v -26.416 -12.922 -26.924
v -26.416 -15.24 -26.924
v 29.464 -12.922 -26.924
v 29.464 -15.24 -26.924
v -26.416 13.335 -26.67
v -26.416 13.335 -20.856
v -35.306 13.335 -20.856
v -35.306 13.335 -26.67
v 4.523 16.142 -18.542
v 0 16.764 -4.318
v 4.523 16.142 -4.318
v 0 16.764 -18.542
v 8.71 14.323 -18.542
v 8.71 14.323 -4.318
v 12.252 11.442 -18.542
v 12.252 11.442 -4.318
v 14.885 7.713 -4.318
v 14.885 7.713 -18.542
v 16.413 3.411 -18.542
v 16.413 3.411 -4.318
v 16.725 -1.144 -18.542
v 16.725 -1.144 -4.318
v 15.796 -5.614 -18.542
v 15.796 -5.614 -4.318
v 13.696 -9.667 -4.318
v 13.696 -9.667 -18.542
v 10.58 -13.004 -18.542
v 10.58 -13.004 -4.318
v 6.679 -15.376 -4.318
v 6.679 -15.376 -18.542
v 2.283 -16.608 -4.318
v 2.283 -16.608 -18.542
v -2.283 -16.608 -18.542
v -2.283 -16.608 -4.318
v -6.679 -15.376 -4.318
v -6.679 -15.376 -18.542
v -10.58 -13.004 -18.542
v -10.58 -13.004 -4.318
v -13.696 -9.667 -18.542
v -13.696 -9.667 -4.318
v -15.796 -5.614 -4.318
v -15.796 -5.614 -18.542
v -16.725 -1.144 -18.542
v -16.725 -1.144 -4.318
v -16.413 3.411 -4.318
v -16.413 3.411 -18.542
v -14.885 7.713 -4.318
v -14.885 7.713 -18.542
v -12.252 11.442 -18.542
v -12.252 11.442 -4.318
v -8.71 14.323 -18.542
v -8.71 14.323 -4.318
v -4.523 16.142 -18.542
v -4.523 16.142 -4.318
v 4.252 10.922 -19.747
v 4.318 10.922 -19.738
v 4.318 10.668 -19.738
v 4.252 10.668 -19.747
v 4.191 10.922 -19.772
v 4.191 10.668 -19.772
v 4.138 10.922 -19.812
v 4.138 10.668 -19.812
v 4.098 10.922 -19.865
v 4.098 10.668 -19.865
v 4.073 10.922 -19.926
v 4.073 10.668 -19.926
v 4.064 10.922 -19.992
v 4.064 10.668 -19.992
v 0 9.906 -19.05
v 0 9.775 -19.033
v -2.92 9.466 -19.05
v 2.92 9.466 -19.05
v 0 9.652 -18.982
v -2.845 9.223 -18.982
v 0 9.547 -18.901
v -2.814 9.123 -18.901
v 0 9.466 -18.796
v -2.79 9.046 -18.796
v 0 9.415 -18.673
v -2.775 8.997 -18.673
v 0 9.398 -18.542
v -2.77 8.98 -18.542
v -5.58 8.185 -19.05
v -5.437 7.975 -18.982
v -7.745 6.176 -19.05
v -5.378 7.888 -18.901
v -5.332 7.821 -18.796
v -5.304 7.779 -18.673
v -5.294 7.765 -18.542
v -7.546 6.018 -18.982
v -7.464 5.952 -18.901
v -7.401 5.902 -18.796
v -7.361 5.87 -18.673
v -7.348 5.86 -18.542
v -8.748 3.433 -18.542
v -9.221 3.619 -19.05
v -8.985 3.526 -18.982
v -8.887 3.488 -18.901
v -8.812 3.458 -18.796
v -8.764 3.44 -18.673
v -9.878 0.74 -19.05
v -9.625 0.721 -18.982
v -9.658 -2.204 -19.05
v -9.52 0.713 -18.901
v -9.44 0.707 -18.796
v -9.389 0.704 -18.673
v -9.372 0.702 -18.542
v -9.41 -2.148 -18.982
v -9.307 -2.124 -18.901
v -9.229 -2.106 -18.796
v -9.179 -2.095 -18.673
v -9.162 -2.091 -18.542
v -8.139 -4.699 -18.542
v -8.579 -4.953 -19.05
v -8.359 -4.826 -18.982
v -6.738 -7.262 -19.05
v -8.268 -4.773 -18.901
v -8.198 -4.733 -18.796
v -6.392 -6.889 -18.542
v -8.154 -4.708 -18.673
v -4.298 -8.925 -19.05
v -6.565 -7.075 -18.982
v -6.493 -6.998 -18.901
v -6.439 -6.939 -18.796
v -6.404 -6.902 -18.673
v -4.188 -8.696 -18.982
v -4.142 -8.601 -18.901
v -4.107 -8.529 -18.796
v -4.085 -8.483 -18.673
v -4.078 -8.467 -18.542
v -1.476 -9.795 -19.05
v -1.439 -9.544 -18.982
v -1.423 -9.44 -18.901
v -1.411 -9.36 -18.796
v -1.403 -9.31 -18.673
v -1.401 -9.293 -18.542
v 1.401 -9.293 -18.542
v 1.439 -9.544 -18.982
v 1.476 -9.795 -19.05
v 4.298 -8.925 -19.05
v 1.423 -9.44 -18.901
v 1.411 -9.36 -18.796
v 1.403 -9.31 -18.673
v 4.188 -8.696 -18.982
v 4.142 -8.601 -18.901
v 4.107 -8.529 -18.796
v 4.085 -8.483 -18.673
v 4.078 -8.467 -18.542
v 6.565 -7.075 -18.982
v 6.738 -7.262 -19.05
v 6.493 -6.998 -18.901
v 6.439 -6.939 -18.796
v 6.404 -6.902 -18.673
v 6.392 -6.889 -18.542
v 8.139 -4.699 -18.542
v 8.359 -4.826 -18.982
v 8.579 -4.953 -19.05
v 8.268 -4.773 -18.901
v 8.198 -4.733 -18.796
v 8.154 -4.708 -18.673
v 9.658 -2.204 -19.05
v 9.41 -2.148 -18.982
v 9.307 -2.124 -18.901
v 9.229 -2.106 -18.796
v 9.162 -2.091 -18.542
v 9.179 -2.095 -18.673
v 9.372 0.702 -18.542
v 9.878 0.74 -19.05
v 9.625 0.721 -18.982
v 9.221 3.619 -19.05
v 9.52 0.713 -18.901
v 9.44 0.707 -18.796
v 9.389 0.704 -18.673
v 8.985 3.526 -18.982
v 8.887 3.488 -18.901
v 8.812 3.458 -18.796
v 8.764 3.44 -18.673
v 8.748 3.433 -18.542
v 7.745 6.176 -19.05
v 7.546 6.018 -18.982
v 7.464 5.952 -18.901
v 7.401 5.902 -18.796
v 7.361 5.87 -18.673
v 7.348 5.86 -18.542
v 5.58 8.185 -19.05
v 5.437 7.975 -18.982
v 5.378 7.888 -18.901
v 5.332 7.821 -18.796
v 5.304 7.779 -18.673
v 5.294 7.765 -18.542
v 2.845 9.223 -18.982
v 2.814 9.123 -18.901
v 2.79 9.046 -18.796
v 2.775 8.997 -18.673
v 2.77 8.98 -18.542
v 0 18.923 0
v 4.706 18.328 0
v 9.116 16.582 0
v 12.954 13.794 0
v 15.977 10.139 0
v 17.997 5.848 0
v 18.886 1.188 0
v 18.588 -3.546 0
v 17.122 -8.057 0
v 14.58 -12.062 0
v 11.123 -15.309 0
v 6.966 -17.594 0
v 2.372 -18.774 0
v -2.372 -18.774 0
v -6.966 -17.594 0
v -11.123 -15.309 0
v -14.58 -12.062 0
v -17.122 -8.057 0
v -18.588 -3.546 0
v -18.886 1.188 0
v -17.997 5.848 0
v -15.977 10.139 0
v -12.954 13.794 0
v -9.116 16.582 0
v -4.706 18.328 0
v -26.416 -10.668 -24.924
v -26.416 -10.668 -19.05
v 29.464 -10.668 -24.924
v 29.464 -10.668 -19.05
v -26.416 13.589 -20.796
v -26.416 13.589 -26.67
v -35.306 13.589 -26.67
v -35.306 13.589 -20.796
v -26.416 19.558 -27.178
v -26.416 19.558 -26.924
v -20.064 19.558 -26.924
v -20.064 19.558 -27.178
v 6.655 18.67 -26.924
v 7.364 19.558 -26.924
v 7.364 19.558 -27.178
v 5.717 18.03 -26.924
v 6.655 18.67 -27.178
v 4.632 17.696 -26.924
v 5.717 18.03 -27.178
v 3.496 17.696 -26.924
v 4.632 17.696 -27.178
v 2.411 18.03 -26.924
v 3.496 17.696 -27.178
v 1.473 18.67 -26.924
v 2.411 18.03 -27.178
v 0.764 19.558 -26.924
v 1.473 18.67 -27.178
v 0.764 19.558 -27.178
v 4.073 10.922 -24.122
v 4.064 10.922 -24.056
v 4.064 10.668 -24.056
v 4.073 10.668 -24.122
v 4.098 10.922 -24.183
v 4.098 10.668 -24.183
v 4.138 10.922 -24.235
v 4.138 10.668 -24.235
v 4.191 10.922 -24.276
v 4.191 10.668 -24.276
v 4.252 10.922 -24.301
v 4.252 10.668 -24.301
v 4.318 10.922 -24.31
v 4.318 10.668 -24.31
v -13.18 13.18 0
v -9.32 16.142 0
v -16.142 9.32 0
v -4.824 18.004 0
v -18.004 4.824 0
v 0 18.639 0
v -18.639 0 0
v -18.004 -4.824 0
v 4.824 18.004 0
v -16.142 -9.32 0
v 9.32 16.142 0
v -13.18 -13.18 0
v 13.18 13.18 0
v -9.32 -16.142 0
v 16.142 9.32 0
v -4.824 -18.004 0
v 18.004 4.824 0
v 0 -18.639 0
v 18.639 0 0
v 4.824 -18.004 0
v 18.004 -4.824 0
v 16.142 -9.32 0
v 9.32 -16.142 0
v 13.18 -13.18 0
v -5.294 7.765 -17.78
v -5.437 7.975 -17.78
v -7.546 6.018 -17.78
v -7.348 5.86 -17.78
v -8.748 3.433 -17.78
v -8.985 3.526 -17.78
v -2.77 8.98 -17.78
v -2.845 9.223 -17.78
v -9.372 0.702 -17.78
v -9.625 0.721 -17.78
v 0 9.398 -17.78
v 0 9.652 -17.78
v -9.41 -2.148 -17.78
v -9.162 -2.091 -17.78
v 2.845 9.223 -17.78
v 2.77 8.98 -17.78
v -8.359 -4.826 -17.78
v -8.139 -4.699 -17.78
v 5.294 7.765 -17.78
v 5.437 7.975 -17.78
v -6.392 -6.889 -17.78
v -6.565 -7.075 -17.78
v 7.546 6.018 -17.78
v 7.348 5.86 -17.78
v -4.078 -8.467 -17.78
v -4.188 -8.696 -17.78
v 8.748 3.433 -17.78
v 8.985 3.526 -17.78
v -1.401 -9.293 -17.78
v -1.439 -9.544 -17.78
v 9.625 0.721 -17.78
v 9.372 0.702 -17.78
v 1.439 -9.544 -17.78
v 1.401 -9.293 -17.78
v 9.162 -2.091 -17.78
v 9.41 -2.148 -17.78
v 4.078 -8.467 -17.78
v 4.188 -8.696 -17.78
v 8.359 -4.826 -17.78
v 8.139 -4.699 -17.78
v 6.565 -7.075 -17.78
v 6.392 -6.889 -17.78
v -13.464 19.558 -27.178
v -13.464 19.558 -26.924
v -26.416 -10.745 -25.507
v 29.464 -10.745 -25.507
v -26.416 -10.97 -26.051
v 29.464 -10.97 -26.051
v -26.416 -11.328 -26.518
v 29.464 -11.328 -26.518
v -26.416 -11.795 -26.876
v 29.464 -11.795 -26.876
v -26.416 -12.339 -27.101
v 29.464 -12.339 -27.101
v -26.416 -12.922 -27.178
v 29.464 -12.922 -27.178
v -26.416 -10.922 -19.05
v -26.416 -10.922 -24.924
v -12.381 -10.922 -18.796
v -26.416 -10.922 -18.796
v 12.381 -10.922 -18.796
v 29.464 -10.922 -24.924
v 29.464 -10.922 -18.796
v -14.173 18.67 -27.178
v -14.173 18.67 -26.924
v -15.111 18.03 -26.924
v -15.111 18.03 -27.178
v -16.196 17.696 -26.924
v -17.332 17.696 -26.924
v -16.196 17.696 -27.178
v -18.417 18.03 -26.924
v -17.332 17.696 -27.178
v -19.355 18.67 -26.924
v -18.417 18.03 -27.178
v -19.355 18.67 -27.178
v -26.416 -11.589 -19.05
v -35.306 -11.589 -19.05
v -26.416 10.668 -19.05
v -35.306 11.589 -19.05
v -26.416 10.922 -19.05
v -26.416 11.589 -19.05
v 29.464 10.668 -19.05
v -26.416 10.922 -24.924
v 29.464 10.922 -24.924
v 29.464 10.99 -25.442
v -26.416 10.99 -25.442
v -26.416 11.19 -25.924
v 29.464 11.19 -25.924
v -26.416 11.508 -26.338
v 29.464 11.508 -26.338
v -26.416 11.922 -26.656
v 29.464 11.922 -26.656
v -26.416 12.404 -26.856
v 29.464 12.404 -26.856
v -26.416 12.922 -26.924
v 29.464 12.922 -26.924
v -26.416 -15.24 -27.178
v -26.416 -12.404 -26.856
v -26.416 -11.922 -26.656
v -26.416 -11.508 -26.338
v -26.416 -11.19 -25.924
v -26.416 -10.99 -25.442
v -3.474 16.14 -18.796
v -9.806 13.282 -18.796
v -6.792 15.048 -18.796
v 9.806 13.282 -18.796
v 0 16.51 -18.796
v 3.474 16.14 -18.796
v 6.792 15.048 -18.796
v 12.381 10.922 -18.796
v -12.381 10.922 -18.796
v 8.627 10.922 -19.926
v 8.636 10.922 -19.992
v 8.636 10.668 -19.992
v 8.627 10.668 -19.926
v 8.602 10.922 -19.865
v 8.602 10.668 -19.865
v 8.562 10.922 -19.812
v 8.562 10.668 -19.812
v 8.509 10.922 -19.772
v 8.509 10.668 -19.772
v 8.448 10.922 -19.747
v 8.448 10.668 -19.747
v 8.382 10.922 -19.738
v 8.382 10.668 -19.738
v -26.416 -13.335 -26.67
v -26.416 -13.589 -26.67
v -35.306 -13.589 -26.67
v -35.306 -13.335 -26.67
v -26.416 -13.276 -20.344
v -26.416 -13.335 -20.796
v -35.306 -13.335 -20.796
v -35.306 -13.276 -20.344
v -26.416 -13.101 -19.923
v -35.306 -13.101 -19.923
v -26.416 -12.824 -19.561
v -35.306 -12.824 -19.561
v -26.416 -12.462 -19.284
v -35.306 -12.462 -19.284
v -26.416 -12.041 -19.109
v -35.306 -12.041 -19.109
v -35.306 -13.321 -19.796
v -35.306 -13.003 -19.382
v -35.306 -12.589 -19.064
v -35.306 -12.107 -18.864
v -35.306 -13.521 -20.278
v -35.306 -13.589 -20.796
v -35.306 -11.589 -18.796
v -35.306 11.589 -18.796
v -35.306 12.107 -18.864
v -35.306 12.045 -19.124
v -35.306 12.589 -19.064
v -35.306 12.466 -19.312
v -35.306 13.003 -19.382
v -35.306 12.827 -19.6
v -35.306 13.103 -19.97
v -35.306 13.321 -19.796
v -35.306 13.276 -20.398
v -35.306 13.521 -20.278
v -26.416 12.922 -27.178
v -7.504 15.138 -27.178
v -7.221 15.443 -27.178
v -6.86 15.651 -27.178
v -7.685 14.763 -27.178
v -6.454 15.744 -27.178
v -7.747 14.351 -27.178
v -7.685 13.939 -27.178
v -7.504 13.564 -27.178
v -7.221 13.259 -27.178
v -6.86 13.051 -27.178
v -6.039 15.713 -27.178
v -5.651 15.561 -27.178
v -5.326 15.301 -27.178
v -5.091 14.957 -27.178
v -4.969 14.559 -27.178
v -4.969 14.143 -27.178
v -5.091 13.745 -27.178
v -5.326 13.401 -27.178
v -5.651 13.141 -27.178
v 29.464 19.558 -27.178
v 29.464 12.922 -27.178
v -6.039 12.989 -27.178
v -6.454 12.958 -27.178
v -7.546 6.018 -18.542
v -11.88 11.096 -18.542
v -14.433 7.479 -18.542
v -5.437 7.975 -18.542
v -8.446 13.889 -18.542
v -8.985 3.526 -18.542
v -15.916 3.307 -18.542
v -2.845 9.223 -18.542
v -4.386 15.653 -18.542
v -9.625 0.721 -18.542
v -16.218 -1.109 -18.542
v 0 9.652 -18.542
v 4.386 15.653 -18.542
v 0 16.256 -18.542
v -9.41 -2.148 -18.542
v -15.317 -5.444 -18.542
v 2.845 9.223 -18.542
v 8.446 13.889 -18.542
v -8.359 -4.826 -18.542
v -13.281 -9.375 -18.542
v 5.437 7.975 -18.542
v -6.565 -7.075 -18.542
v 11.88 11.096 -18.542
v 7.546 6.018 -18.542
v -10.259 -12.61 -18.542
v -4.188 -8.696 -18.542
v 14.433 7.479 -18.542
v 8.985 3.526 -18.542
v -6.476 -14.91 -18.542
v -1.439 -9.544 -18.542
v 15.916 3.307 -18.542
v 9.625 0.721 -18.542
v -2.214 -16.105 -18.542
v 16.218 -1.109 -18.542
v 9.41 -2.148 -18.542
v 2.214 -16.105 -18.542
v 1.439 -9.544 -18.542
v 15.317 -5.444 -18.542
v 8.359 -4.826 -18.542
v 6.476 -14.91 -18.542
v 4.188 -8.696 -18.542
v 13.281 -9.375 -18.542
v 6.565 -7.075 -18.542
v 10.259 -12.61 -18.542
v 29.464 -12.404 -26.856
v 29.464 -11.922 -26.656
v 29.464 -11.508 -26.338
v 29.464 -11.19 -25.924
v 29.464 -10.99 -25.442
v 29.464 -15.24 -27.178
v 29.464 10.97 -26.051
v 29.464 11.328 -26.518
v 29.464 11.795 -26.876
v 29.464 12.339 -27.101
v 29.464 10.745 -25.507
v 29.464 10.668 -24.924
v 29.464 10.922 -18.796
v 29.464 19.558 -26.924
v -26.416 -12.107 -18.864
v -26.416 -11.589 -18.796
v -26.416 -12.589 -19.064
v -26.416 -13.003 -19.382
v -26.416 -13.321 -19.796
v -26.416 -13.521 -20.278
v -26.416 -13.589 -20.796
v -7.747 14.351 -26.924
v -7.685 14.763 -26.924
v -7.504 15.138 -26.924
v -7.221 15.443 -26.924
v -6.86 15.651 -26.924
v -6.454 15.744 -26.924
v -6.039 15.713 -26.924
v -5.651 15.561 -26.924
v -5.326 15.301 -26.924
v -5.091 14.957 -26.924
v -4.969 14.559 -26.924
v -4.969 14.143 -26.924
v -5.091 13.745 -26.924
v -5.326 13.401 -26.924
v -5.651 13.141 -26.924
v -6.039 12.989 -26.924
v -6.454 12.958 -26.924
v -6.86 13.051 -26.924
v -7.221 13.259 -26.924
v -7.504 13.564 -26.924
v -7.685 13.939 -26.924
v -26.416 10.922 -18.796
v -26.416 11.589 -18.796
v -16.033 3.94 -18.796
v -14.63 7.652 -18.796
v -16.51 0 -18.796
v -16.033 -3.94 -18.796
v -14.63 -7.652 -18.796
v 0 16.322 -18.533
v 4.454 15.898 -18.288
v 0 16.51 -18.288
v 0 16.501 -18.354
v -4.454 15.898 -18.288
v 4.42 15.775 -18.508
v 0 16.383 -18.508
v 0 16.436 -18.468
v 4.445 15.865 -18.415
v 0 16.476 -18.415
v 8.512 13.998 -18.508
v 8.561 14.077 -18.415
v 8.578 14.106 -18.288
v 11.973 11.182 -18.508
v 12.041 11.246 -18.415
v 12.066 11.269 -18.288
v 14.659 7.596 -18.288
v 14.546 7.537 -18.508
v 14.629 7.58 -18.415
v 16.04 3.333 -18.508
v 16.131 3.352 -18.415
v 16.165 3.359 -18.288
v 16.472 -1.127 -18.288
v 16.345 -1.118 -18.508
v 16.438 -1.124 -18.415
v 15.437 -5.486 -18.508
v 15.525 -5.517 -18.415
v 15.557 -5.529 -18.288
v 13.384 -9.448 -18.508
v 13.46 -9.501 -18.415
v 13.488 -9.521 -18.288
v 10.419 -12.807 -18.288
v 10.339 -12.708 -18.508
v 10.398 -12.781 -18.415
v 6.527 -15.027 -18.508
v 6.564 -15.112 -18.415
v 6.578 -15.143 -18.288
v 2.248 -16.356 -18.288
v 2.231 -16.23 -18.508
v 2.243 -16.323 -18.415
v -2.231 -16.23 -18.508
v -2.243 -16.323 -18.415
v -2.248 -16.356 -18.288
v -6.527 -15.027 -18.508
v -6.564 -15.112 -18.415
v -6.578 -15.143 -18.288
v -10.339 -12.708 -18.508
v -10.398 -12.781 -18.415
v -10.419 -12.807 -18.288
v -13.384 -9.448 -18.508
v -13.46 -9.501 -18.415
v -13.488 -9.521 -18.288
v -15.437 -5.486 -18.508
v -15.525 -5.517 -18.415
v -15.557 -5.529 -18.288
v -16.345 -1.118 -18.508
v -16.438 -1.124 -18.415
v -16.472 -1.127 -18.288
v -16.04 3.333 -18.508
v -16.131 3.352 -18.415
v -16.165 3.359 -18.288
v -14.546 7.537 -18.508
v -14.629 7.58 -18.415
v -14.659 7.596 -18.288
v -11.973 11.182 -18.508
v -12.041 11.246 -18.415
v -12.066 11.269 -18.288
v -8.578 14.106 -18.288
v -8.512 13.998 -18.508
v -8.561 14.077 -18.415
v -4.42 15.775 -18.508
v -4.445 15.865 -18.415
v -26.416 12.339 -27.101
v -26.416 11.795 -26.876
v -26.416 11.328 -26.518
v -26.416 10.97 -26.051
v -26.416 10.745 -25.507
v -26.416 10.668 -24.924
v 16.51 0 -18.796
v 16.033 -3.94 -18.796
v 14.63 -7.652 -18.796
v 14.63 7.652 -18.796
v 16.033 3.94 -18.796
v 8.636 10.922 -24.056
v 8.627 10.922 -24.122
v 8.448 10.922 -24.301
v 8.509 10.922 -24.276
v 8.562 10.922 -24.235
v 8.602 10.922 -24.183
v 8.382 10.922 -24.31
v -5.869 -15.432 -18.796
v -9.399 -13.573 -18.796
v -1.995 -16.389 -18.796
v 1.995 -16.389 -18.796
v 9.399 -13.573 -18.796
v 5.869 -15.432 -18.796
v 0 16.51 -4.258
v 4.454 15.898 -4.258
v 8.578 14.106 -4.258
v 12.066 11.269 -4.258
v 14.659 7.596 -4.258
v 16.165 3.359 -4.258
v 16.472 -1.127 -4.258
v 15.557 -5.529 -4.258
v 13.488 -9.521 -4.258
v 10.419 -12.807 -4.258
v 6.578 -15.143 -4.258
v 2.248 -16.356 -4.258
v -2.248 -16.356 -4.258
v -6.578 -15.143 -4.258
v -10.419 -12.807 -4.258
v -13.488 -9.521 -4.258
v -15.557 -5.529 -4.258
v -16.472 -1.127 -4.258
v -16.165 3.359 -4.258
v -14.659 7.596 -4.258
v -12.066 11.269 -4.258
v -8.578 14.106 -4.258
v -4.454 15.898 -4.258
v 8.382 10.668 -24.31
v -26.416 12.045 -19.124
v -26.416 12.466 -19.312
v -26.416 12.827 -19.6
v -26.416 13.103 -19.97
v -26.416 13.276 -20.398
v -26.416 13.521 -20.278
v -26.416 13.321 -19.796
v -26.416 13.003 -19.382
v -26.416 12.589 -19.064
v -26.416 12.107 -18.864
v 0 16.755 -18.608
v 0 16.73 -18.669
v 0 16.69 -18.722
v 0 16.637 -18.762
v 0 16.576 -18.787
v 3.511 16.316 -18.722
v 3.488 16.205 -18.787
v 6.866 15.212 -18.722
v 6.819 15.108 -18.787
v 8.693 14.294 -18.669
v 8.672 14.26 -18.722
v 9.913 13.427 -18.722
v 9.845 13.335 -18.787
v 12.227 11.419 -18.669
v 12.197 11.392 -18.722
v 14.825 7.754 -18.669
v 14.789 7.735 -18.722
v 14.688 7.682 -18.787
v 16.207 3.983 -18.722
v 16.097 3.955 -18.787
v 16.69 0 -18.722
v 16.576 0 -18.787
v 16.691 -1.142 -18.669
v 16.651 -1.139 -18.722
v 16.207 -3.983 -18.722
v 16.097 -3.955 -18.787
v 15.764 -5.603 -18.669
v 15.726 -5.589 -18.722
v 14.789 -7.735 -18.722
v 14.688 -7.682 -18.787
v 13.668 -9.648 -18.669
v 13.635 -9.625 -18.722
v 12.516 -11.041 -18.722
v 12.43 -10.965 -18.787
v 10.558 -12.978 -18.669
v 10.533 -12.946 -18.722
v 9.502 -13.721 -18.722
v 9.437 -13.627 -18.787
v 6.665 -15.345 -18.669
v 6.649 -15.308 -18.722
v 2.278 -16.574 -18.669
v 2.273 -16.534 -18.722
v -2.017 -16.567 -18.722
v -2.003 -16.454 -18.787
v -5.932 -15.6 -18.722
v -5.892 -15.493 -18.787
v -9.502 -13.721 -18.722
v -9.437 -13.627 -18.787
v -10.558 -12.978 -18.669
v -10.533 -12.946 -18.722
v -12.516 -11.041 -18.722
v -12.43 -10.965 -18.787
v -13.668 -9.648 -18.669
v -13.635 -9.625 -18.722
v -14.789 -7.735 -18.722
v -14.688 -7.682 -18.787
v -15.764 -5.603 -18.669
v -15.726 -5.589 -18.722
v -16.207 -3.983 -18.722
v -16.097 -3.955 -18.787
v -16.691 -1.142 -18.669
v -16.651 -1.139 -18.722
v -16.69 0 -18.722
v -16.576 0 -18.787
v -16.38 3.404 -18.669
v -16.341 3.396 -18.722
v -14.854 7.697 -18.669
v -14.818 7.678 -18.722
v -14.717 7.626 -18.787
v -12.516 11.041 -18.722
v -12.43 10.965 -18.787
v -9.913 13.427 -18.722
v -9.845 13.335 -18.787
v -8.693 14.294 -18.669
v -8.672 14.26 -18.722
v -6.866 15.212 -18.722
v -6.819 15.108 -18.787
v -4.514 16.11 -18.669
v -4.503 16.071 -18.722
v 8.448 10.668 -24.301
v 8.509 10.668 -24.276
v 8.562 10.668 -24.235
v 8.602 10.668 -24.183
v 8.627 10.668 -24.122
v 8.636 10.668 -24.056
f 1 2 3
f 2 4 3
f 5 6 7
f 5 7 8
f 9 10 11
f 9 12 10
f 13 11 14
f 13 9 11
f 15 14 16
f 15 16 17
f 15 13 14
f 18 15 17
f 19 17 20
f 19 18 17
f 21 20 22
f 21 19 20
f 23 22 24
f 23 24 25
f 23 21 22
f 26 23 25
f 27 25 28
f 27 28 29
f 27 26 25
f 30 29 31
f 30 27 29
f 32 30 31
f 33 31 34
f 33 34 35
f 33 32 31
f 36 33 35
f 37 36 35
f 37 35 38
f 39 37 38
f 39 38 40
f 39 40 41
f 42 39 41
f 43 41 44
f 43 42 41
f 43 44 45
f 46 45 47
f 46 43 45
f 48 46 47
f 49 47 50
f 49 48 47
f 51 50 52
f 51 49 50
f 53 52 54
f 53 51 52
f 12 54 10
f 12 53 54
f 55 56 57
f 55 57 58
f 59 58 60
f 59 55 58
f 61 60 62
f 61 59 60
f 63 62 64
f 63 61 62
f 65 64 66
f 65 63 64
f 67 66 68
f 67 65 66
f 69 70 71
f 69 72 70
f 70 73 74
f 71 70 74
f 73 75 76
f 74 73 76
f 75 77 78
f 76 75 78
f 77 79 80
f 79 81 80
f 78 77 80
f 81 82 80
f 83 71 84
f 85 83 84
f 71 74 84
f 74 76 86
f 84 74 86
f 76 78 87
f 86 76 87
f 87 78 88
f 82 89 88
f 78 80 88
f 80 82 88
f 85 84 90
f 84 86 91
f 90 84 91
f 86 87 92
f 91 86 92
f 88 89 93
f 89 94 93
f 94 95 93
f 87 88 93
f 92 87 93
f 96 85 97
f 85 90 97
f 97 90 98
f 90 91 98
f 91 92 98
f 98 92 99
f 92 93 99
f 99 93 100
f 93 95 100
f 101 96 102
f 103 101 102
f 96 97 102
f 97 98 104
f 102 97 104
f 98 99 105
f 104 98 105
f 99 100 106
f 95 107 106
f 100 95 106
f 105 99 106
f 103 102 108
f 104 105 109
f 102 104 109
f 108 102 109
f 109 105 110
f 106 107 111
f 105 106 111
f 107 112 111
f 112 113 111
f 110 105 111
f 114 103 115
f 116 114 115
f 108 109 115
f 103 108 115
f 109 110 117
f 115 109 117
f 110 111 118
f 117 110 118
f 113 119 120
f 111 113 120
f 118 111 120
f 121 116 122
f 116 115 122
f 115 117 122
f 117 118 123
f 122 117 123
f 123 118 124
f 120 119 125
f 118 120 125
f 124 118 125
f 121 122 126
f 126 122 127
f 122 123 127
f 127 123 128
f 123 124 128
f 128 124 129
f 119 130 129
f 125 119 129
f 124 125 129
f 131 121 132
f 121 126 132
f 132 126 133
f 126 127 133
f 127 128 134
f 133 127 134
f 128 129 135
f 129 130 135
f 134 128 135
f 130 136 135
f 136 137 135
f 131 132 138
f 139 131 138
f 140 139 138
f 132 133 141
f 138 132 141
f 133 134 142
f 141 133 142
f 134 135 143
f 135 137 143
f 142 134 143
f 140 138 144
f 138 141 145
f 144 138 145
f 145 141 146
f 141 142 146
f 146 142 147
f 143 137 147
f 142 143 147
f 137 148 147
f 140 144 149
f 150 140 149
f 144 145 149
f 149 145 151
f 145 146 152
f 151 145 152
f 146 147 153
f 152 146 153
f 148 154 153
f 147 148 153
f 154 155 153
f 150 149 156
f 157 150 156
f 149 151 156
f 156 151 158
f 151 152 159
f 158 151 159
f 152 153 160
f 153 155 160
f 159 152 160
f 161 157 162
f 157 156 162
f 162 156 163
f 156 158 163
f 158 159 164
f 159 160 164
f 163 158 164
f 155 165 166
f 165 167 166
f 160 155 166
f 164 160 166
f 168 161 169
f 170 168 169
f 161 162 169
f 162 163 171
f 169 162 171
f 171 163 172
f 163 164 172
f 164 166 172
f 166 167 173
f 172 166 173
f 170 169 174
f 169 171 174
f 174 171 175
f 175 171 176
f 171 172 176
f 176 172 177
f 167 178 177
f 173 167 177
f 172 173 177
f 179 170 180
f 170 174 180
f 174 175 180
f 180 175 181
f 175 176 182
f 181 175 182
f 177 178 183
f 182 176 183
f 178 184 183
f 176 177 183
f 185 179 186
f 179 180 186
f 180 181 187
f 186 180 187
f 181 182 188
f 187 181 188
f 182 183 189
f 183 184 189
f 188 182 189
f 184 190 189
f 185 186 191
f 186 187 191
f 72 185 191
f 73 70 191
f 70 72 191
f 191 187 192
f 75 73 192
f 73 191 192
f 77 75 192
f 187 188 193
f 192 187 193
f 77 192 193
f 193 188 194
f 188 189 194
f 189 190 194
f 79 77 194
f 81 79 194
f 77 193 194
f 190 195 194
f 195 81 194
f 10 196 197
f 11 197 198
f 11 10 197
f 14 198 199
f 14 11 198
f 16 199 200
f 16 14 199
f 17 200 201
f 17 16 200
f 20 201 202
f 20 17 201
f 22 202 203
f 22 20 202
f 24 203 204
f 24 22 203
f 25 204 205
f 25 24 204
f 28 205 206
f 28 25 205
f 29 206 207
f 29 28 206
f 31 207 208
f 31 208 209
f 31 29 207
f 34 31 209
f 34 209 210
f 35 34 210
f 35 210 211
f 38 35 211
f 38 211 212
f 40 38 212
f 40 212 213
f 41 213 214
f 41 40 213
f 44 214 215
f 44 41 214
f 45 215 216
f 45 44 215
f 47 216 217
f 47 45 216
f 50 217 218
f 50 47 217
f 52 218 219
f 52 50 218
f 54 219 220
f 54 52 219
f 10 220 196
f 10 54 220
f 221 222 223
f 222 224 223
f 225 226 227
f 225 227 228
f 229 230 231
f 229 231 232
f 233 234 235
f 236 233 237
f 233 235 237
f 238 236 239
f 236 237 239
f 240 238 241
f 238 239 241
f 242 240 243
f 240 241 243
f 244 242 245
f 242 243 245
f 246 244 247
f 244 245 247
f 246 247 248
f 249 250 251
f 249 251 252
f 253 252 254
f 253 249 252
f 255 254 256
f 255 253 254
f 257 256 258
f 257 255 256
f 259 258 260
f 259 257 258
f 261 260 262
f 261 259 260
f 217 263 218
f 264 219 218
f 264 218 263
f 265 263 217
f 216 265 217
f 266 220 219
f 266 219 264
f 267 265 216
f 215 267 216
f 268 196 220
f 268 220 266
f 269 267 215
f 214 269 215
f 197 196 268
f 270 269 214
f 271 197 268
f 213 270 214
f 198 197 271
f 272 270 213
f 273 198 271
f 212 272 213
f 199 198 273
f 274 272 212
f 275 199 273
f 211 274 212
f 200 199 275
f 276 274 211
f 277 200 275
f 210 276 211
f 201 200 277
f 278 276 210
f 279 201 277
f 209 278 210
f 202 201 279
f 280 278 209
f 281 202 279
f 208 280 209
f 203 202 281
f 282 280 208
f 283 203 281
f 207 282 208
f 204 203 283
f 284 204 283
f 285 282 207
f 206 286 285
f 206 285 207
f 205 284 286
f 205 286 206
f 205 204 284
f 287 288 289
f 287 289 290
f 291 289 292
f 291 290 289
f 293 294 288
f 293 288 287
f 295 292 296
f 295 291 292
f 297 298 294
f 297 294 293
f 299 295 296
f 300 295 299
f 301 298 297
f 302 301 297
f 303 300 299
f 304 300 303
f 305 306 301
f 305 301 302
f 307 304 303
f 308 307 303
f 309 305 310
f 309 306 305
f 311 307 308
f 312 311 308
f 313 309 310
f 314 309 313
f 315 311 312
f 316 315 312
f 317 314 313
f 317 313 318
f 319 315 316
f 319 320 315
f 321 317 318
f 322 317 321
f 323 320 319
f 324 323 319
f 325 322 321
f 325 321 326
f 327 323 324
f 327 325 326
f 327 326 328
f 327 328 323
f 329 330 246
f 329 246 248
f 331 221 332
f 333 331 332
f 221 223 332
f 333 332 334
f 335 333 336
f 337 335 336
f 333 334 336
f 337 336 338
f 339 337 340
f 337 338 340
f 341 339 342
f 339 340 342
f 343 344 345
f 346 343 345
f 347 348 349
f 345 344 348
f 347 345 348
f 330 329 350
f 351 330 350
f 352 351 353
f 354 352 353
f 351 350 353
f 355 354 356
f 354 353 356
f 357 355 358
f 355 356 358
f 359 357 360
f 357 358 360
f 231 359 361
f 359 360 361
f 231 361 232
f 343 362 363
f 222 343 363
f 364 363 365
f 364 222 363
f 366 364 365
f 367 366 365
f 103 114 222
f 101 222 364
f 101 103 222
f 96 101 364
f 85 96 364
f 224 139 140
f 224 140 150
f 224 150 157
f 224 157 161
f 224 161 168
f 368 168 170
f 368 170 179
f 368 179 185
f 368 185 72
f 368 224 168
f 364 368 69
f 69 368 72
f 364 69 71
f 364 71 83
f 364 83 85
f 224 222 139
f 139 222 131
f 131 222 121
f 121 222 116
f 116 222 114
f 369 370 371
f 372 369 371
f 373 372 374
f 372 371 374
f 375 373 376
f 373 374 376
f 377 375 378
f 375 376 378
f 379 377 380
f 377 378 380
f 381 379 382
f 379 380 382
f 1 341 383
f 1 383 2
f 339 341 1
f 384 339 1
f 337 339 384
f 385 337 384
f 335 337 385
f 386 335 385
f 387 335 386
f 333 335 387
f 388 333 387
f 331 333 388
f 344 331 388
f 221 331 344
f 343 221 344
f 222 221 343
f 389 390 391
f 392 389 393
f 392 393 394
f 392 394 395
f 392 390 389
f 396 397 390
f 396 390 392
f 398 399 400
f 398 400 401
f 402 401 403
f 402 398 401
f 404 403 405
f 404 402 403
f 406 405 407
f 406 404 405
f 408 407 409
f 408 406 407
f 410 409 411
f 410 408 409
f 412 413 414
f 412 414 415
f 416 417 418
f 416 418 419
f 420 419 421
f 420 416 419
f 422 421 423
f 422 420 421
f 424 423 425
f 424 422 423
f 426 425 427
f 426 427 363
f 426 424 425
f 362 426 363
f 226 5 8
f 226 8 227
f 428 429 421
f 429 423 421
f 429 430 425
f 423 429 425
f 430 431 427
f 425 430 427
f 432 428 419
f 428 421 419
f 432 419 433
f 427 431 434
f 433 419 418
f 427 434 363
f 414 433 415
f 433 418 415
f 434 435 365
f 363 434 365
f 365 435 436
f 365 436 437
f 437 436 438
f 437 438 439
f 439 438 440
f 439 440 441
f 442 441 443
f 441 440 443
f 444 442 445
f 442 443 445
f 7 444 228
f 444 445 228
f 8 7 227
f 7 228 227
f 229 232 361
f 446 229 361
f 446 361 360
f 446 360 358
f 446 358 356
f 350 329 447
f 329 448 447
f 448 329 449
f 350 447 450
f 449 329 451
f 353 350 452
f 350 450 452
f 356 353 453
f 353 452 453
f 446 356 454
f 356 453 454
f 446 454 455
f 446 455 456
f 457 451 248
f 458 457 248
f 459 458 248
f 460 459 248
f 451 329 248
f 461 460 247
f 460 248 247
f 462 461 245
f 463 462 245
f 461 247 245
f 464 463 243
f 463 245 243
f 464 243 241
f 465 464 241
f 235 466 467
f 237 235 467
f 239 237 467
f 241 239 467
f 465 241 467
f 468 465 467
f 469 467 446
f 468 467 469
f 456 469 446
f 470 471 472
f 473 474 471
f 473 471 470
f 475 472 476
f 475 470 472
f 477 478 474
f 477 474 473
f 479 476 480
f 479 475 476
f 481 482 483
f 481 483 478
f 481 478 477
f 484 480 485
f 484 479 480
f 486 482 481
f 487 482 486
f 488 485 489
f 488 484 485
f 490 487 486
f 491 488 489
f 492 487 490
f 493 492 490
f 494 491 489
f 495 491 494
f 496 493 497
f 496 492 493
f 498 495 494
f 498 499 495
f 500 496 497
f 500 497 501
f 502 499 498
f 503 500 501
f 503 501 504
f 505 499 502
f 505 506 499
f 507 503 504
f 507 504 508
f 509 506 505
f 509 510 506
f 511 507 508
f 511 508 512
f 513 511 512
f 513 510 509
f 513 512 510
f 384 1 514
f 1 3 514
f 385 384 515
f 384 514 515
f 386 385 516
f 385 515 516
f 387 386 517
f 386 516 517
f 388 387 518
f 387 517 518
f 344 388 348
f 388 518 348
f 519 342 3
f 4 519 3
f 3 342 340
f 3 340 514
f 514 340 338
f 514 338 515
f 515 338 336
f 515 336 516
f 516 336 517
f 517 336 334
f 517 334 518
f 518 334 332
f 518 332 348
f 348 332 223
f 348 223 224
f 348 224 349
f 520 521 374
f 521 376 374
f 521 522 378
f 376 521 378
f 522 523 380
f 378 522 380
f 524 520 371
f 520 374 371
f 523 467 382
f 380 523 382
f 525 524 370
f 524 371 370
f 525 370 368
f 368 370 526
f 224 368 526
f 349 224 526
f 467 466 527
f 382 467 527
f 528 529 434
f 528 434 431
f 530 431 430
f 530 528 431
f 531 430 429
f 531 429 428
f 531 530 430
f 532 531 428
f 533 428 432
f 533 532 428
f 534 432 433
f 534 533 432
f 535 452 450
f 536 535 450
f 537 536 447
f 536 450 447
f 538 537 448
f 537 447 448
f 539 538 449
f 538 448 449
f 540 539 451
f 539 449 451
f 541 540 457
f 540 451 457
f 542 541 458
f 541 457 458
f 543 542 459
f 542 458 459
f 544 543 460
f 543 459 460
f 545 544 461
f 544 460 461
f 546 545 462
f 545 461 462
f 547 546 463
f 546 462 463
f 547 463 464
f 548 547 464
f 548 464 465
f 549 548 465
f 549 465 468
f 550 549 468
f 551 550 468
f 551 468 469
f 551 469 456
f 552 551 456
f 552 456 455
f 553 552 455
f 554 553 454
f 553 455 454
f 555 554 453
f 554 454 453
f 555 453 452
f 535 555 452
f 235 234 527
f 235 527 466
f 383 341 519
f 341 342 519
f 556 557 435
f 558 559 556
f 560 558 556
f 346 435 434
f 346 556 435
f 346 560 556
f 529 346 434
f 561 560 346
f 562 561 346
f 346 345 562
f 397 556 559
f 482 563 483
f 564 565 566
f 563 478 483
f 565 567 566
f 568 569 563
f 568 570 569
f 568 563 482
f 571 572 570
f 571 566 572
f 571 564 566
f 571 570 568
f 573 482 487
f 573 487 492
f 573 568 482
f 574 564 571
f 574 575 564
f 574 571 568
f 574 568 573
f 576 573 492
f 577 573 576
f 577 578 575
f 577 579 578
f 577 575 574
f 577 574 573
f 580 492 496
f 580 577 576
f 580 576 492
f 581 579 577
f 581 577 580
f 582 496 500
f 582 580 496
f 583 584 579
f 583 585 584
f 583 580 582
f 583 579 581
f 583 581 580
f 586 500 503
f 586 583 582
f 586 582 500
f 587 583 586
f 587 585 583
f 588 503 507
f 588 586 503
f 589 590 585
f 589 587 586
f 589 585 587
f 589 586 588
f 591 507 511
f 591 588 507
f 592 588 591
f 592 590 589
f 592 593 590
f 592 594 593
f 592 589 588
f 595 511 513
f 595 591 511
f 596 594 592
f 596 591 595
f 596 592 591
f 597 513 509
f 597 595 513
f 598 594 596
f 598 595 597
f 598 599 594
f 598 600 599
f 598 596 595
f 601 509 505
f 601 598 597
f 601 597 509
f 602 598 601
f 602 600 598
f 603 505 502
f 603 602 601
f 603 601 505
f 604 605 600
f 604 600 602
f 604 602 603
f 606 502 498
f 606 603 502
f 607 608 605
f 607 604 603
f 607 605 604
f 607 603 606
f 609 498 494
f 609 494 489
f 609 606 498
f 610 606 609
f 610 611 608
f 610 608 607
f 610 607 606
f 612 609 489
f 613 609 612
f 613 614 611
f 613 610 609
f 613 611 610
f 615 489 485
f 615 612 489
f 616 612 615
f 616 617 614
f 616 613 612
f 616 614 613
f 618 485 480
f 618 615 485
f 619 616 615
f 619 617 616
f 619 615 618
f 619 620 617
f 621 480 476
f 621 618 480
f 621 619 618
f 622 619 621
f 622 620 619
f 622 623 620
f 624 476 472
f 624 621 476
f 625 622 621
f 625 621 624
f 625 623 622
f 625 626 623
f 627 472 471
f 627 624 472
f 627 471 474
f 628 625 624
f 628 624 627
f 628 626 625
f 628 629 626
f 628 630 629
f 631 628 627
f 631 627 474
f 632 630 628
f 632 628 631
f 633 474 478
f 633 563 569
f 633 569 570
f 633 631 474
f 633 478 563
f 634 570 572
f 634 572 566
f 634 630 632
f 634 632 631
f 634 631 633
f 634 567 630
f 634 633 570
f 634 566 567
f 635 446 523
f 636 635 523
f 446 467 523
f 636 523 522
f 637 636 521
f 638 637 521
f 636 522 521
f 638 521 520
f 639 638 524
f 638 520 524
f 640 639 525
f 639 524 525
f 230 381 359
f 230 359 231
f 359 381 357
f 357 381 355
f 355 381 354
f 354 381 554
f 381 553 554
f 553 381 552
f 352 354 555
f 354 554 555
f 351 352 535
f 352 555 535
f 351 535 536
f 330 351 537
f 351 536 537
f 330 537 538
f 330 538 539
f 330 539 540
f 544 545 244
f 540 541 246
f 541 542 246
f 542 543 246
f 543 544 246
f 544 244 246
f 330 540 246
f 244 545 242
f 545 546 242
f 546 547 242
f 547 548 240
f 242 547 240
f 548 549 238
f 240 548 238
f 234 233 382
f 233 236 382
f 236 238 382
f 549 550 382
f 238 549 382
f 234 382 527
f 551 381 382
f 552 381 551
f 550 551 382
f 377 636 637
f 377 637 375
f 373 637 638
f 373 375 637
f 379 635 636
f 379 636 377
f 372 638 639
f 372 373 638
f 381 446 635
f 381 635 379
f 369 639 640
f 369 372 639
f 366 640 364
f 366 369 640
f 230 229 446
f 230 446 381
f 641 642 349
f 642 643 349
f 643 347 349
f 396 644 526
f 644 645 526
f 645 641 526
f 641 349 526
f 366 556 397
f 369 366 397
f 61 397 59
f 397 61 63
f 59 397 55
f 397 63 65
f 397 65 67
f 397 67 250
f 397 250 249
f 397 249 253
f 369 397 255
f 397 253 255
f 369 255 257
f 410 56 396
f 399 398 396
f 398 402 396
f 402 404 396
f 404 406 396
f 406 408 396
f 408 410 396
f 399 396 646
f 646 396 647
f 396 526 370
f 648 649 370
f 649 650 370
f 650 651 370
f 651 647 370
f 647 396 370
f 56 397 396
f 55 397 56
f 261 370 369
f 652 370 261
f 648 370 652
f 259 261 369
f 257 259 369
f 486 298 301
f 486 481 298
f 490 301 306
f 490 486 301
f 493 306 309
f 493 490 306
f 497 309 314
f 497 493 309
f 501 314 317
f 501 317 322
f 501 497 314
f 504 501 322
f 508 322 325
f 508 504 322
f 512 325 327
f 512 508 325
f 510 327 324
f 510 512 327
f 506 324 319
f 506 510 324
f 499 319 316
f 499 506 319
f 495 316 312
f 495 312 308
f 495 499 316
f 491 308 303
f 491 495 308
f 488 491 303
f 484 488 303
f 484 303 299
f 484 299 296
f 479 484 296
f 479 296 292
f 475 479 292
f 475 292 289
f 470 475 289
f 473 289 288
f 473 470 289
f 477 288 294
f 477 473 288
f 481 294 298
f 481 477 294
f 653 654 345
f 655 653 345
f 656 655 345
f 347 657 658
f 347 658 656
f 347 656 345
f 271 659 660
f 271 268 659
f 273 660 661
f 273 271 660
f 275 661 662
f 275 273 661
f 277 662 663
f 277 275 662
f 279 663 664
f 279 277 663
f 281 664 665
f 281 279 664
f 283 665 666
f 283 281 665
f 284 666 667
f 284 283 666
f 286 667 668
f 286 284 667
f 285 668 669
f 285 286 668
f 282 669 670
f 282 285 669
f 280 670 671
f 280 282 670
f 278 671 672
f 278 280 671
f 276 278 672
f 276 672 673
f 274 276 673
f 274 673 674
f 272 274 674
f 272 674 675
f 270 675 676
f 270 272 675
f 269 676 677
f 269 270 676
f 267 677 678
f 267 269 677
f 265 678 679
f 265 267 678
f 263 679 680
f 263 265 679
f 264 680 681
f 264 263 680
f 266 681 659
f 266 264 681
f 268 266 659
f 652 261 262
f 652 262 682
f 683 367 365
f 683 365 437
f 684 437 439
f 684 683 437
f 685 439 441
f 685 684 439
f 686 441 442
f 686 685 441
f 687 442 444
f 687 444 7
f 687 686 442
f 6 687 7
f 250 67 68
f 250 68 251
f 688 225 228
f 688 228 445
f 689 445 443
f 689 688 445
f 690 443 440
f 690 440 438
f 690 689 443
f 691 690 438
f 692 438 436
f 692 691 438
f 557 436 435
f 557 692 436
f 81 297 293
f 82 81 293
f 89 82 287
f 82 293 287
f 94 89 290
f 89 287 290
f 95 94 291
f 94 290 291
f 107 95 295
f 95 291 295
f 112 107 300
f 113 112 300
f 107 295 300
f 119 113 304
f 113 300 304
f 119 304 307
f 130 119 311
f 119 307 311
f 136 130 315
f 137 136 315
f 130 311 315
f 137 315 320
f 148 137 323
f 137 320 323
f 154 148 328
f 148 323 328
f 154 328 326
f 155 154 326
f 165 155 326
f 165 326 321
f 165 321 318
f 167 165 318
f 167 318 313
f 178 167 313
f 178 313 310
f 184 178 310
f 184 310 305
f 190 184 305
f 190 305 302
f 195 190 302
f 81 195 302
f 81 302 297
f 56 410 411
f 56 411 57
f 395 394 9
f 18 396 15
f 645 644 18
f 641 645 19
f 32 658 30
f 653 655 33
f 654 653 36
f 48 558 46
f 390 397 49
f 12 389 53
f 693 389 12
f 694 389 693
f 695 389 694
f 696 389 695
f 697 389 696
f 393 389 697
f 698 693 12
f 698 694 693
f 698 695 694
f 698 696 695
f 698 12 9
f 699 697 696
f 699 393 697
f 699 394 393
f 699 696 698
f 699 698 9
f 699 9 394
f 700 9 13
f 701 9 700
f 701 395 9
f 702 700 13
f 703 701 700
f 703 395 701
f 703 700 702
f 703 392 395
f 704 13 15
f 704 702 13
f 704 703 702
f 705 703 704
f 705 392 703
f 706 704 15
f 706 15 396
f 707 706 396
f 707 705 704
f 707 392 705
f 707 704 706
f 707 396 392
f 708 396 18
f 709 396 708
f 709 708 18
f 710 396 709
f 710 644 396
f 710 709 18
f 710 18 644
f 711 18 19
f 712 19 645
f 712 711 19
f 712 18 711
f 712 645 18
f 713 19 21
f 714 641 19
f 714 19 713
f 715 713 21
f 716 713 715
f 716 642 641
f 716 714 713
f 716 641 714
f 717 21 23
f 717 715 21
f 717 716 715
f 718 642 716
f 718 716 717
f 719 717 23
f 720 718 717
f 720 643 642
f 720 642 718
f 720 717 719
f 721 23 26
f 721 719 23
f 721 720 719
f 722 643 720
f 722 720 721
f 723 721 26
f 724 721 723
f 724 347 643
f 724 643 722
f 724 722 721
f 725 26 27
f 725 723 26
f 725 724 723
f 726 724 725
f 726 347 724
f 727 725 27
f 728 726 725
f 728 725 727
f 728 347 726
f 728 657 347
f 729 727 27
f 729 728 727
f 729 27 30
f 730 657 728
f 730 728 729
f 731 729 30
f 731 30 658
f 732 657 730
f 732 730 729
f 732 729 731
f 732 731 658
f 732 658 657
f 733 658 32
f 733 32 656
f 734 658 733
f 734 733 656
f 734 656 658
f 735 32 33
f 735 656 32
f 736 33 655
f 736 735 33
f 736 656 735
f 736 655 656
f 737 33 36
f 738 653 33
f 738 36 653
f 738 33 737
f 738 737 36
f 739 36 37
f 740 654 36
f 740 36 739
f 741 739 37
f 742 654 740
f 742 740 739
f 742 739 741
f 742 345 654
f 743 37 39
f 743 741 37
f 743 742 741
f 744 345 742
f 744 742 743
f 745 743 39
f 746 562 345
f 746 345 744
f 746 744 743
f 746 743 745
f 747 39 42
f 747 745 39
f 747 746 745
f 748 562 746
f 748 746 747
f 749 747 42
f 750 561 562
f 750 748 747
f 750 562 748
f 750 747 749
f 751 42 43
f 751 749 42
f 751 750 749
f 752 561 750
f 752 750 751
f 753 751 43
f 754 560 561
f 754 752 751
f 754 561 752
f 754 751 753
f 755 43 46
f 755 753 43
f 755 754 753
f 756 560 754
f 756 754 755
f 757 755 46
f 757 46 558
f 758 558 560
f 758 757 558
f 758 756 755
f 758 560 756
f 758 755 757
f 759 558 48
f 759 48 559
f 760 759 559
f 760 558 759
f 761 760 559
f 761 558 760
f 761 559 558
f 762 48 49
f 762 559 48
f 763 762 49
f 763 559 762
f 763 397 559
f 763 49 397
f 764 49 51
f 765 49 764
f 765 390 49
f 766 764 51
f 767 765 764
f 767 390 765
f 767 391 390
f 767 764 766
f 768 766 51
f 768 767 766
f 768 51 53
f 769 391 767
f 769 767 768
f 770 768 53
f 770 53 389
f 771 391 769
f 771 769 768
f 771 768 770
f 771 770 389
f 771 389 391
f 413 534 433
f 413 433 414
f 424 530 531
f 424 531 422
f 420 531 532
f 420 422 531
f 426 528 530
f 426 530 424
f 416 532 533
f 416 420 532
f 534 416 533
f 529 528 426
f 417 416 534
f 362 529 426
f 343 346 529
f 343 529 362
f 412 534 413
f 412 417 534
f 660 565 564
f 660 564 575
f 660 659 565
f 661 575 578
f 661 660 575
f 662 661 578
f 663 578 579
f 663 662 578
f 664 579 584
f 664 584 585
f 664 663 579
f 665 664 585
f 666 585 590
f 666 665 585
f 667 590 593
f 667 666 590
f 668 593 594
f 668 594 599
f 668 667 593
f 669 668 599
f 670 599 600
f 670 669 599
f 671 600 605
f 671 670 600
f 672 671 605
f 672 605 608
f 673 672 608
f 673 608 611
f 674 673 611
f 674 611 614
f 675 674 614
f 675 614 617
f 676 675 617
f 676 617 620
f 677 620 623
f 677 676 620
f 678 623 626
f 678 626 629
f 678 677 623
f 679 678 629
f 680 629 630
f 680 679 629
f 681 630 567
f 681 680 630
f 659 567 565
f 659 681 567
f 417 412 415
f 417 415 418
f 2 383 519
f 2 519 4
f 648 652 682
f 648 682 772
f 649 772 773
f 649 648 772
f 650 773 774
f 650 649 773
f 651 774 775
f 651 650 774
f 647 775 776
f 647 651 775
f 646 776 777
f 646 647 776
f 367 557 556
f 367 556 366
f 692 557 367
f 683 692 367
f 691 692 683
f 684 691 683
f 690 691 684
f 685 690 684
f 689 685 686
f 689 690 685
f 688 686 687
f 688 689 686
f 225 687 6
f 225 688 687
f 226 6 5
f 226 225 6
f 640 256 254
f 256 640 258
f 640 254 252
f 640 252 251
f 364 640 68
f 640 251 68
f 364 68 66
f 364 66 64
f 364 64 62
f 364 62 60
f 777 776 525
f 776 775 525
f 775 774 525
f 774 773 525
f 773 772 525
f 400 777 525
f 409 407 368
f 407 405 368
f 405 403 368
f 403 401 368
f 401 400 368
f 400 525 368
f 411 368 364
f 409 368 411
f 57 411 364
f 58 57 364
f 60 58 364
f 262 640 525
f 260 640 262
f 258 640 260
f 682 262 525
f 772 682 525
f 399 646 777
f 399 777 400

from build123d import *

# Parameters (mm, degrees)
BOSS_EXTRUDE2_DEPTH = 12.7
BOSS_EXTRUDE3_DEPTH = 43.18
BOSS_EXTRUDE4_DEPTH = 8.89
SKETCH10_R          = 9.398
CUT_EXTRUDE2_DEPTH  = 9.398
FILLET1_R           = 0.508
SKETCH11_R          = 1.397
CUT_EXTRUDE3_DEPTH  = 0.254
SKETCH12_R          = 3.81
CUT_EXTRUDE5_DEPTH  = 2.54
CUT_EXTRUDE6_REACH  = 31.845


with BuildPart() as part:
    # Sketch2 → Revolve1 (revolve)
    with BuildSketch(Plane(origin=(0, 0, 0), x_dir=(0, 0, -1), z_dir=(1, 0, 0))):
        with BuildLine():
            Line((0, 18.923), (4.318, 16.764))
            Line((4.318, 16.764), (18.542, 16.764))
            ThreePointArc((18.542, 16.764), (18.721605122, 16.689605122), (18.796, 16.51))
            Line((18.796, 16.51), (18.796, 9.398))
            Line((18.796, 9.398), (17.78, 9.398))
            Line((17.78, 9.398), (17.78, 9.652))
            Line((17.78, 9.652), (18.542, 9.652))
            Line((18.542, 9.652), (18.542, 16.256))
            ThreePointArc((18.542, 16.256), (18.467605122, 16.435605122), (18.288, 16.51))
            Line((18.288, 16.51), (4.258038734, 16.51))
            Line((4.258038734, 16.51), (0, 18.639019367))
            Line((0, 18.639019367), (0, 18.923))
        make_face()
    revolve(axis=Axis((0, 0, 8.948655539), (0, 0, -1)))



with BuildPart() as body_2:
    # Sketch6 → Boss-Extrude2 (new body)
    with BuildSketch(Plane(origin=(16.764, 0, 0), x_dir=(0, 0, -1), z_dir=(1, 0, 0))):
        with BuildLine():
            Line((26.924, 19.558), (27.178, 19.558))
            Line((27.178, 19.558), (27.178, 12.92200108))
            ThreePointArc((27.178, 12.92200108), (26.517818368, 11.328181632), (24.92399892, 10.668))
            Line((24.92399892, 10.668), (19.05, 10.668))
            Line((19.05, 10.668), (19.05, -10.668))
            Line((19.05, -10.668), (24.92399892, -10.668))
            ThreePointArc((24.92399892, -10.668), (26.517818368, -11.328181632), (27.178, -12.92200108))
            Line((27.178, -12.92200108), (27.178, -15.24))
            Line((27.178, -15.24), (26.924, -15.24))
            Line((26.924, -15.24), (26.924, -12.92200108))
            ThreePointArc((26.924, -12.92200108), (26.338213246, -11.507786754), (24.92399892, -10.922))
            Line((24.92399892, -10.922), (18.796, -10.922))
            Line((18.796, -10.922), (18.796, 10.922))
            Line((18.796, 10.922), (24.92399892, 10.922))
            ThreePointArc((24.92399892, 10.922), (26.338213246, 11.507786754), (26.924, 12.92200108))
            Line((26.924, 12.92200108), (26.924, 19.558))
        make_face()
    extrude(amount=BOSS_EXTRUDE2_DEPTH)


with BuildPart() as part_1:
    add(part.part)

    add(body_2.part)  # Boss-Extrude3 merges body 2
    # Sketch8 → Boss-Extrude3 (add)
    with BuildSketch(Plane.ZY.offset(-16.764)):
        with BuildLine():
            Line((-26.924, 12.92200108), (-26.924, 19.558))
            Line((-26.924, 19.558), (-27.178, 19.558))
            Line((-27.178, 19.558), (-27.178, 12.92200108))
            ThreePointArc((-27.178, 12.92200108), (-26.517818368, 11.328181632), (-24.92399892, 10.668))
            Line((-24.92399892, 10.668), (-19.05, 10.668))
            Line((-19.05, 10.668), (-19.05, -10.668))
            Line((-19.05, -10.668), (-24.92399892, -10.668))
            ThreePointArc((-24.92399892, -10.668), (-26.517818368, -11.328181632), (-27.178, -12.92200108))
            Line((-27.178, -12.92200108), (-27.178, -15.24))
            Line((-27.178, -15.24), (-26.924, -15.24))
            Line((-26.924, -15.24), (-26.924, -12.92200108))
            ThreePointArc((-26.924, -12.92200108), (-26.338213246, -11.507786754), (-24.92399892, -10.922))
            Line((-24.92399892, -10.922), (-18.796, -10.922))
            Line((-18.796, -10.922), (-18.796, 10.922))
            Line((-18.796, 10.922), (-24.92399892, 10.922))
            ThreePointArc((-24.92399892, 10.922), (-26.338213246, 11.507786754), (-26.924, 12.92200108))
        make_face()
    extrude(amount=BOSS_EXTRUDE3_DEPTH)

    # Sketch9 → Boss-Extrude4 (add)
    with BuildSketch(Plane.ZY.offset(26.416)):
        with BuildLine():
            Line((-18.796, 11.58899892), (-18.796, -11.58899892))
            ThreePointArc((-18.796, -11.58899892), (-19.381786754, -13.003213246), (-20.79600108, -13.589))
            Line((-20.79600108, -13.589), (-26.67, -13.589))
            Line((-26.67, -13.589), (-26.67, -13.335))
            Line((-26.67, -13.335), (-20.79600108, -13.335))
            ThreePointArc((-20.79600108, -13.335), (-19.561391876, -12.823608124), (-19.05, -11.58899892))
            Line((-19.05, -11.58899892), (-19.05, 11.58899892))
            ThreePointArc((-19.05, 11.58899892), (-19.599773222, 12.827111013), (-20.855647788, 13.335))
            Line((-20.855647788, 13.335), (-26.67, 13.335))
            Line((-26.67, 13.335), (-26.67, 13.589))
            Line((-26.67, 13.589), (-20.79600108, 13.589))
            ThreePointArc((-20.79600108, 13.589), (-19.381786754, 13.003213246), (-18.796, 11.58899892))
        make_face()
    extrude(amount=BOSS_EXTRUDE4_DEPTH)

    # Sketch10 → Cut-Extrude2 (cut)
    with BuildSketch(Plane.XY.offset(-18.796)):
        Circle(SKETCH10_R)
    extrude(amount=-CUT_EXTRUDE2_DEPTH, mode=Mode.SUBTRACT)

    # Fillet1
    fillet1_edges = [part_1.edges().sort_by_distance(p)[0] for p in [
        (-9.398, 0, -19.05),
    ]]
    fillet(fillet1_edges, radius=FILLET1_R)

    # Sketch11 → Cut-Extrude3 (cut)
    with BuildSketch(Plane(origin=(0, 0, -27.178), x_dir=(-1, 0, 0), z_dir=(0, 0, -1))):
        with Locations((6.35, 14.351)):
            Circle(SKETCH11_R)
    extrude(amount=-CUT_EXTRUDE3_DEPTH, mode=Mode.SUBTRACT)

    # Sketch12 → Cut-Extrude5 (cut)
    with BuildSketch(Plane(origin=(0, 0, -27.178), x_dir=(-1, 0, 0), z_dir=(0, 0, -1))):
        with Locations((16.764, 21.463)):
            Circle(SKETCH12_R)
        with Locations((-4.064, 21.463)):
            Circle(SKETCH12_R)
    extrude(amount=-CUT_EXTRUDE5_DEPTH, mode=Mode.SUBTRACT)

    # Sketch13 → Cut-Extrude6 (cut, up to next)
    with BuildSketch(Plane(origin=(0, 10.922, 0), x_dir=(1, 0, 0), z_dir=(0, 1, 0)), mode=Mode.PRIVATE) as cut_extrude6_sk1:
        with BuildLine():
            Line((4.318, 24.309866454), (8.382, 24.309866454))
            ThreePointArc((8.382, 24.309866454), (8.561605122, 24.235471576), (8.636, 24.055866454))
            Line((8.636, 24.055866454), (8.636, 19.991866454))
            ThreePointArc((8.636, 19.991866454), (8.561605122, 19.812261332), (8.382, 19.737866454))
            Line((8.382, 19.737866454), (4.318, 19.737866454))
            ThreePointArc((4.318, 19.737866454), (4.138394878, 19.812261332), (4.064, 19.991866454))
            Line((4.064, 19.991866454), (4.064, 24.055866454))
            ThreePointArc((4.064, 24.055866454), (4.138394878, 24.235471576), (4.318, 24.309866454))
        make_face()
    cut_extrude6_tool1 = extrude(cut_extrude6_sk1.sketch, amount=-CUT_EXTRUDE6_REACH, mode=Mode.PRIVATE) & part_1.part
    add(cut_extrude6_tool1.solids().sort_by_distance((6.35, 10.922, -22.023866))[0], mode=Mode.SUBTRACT)


solid = part_1.part
